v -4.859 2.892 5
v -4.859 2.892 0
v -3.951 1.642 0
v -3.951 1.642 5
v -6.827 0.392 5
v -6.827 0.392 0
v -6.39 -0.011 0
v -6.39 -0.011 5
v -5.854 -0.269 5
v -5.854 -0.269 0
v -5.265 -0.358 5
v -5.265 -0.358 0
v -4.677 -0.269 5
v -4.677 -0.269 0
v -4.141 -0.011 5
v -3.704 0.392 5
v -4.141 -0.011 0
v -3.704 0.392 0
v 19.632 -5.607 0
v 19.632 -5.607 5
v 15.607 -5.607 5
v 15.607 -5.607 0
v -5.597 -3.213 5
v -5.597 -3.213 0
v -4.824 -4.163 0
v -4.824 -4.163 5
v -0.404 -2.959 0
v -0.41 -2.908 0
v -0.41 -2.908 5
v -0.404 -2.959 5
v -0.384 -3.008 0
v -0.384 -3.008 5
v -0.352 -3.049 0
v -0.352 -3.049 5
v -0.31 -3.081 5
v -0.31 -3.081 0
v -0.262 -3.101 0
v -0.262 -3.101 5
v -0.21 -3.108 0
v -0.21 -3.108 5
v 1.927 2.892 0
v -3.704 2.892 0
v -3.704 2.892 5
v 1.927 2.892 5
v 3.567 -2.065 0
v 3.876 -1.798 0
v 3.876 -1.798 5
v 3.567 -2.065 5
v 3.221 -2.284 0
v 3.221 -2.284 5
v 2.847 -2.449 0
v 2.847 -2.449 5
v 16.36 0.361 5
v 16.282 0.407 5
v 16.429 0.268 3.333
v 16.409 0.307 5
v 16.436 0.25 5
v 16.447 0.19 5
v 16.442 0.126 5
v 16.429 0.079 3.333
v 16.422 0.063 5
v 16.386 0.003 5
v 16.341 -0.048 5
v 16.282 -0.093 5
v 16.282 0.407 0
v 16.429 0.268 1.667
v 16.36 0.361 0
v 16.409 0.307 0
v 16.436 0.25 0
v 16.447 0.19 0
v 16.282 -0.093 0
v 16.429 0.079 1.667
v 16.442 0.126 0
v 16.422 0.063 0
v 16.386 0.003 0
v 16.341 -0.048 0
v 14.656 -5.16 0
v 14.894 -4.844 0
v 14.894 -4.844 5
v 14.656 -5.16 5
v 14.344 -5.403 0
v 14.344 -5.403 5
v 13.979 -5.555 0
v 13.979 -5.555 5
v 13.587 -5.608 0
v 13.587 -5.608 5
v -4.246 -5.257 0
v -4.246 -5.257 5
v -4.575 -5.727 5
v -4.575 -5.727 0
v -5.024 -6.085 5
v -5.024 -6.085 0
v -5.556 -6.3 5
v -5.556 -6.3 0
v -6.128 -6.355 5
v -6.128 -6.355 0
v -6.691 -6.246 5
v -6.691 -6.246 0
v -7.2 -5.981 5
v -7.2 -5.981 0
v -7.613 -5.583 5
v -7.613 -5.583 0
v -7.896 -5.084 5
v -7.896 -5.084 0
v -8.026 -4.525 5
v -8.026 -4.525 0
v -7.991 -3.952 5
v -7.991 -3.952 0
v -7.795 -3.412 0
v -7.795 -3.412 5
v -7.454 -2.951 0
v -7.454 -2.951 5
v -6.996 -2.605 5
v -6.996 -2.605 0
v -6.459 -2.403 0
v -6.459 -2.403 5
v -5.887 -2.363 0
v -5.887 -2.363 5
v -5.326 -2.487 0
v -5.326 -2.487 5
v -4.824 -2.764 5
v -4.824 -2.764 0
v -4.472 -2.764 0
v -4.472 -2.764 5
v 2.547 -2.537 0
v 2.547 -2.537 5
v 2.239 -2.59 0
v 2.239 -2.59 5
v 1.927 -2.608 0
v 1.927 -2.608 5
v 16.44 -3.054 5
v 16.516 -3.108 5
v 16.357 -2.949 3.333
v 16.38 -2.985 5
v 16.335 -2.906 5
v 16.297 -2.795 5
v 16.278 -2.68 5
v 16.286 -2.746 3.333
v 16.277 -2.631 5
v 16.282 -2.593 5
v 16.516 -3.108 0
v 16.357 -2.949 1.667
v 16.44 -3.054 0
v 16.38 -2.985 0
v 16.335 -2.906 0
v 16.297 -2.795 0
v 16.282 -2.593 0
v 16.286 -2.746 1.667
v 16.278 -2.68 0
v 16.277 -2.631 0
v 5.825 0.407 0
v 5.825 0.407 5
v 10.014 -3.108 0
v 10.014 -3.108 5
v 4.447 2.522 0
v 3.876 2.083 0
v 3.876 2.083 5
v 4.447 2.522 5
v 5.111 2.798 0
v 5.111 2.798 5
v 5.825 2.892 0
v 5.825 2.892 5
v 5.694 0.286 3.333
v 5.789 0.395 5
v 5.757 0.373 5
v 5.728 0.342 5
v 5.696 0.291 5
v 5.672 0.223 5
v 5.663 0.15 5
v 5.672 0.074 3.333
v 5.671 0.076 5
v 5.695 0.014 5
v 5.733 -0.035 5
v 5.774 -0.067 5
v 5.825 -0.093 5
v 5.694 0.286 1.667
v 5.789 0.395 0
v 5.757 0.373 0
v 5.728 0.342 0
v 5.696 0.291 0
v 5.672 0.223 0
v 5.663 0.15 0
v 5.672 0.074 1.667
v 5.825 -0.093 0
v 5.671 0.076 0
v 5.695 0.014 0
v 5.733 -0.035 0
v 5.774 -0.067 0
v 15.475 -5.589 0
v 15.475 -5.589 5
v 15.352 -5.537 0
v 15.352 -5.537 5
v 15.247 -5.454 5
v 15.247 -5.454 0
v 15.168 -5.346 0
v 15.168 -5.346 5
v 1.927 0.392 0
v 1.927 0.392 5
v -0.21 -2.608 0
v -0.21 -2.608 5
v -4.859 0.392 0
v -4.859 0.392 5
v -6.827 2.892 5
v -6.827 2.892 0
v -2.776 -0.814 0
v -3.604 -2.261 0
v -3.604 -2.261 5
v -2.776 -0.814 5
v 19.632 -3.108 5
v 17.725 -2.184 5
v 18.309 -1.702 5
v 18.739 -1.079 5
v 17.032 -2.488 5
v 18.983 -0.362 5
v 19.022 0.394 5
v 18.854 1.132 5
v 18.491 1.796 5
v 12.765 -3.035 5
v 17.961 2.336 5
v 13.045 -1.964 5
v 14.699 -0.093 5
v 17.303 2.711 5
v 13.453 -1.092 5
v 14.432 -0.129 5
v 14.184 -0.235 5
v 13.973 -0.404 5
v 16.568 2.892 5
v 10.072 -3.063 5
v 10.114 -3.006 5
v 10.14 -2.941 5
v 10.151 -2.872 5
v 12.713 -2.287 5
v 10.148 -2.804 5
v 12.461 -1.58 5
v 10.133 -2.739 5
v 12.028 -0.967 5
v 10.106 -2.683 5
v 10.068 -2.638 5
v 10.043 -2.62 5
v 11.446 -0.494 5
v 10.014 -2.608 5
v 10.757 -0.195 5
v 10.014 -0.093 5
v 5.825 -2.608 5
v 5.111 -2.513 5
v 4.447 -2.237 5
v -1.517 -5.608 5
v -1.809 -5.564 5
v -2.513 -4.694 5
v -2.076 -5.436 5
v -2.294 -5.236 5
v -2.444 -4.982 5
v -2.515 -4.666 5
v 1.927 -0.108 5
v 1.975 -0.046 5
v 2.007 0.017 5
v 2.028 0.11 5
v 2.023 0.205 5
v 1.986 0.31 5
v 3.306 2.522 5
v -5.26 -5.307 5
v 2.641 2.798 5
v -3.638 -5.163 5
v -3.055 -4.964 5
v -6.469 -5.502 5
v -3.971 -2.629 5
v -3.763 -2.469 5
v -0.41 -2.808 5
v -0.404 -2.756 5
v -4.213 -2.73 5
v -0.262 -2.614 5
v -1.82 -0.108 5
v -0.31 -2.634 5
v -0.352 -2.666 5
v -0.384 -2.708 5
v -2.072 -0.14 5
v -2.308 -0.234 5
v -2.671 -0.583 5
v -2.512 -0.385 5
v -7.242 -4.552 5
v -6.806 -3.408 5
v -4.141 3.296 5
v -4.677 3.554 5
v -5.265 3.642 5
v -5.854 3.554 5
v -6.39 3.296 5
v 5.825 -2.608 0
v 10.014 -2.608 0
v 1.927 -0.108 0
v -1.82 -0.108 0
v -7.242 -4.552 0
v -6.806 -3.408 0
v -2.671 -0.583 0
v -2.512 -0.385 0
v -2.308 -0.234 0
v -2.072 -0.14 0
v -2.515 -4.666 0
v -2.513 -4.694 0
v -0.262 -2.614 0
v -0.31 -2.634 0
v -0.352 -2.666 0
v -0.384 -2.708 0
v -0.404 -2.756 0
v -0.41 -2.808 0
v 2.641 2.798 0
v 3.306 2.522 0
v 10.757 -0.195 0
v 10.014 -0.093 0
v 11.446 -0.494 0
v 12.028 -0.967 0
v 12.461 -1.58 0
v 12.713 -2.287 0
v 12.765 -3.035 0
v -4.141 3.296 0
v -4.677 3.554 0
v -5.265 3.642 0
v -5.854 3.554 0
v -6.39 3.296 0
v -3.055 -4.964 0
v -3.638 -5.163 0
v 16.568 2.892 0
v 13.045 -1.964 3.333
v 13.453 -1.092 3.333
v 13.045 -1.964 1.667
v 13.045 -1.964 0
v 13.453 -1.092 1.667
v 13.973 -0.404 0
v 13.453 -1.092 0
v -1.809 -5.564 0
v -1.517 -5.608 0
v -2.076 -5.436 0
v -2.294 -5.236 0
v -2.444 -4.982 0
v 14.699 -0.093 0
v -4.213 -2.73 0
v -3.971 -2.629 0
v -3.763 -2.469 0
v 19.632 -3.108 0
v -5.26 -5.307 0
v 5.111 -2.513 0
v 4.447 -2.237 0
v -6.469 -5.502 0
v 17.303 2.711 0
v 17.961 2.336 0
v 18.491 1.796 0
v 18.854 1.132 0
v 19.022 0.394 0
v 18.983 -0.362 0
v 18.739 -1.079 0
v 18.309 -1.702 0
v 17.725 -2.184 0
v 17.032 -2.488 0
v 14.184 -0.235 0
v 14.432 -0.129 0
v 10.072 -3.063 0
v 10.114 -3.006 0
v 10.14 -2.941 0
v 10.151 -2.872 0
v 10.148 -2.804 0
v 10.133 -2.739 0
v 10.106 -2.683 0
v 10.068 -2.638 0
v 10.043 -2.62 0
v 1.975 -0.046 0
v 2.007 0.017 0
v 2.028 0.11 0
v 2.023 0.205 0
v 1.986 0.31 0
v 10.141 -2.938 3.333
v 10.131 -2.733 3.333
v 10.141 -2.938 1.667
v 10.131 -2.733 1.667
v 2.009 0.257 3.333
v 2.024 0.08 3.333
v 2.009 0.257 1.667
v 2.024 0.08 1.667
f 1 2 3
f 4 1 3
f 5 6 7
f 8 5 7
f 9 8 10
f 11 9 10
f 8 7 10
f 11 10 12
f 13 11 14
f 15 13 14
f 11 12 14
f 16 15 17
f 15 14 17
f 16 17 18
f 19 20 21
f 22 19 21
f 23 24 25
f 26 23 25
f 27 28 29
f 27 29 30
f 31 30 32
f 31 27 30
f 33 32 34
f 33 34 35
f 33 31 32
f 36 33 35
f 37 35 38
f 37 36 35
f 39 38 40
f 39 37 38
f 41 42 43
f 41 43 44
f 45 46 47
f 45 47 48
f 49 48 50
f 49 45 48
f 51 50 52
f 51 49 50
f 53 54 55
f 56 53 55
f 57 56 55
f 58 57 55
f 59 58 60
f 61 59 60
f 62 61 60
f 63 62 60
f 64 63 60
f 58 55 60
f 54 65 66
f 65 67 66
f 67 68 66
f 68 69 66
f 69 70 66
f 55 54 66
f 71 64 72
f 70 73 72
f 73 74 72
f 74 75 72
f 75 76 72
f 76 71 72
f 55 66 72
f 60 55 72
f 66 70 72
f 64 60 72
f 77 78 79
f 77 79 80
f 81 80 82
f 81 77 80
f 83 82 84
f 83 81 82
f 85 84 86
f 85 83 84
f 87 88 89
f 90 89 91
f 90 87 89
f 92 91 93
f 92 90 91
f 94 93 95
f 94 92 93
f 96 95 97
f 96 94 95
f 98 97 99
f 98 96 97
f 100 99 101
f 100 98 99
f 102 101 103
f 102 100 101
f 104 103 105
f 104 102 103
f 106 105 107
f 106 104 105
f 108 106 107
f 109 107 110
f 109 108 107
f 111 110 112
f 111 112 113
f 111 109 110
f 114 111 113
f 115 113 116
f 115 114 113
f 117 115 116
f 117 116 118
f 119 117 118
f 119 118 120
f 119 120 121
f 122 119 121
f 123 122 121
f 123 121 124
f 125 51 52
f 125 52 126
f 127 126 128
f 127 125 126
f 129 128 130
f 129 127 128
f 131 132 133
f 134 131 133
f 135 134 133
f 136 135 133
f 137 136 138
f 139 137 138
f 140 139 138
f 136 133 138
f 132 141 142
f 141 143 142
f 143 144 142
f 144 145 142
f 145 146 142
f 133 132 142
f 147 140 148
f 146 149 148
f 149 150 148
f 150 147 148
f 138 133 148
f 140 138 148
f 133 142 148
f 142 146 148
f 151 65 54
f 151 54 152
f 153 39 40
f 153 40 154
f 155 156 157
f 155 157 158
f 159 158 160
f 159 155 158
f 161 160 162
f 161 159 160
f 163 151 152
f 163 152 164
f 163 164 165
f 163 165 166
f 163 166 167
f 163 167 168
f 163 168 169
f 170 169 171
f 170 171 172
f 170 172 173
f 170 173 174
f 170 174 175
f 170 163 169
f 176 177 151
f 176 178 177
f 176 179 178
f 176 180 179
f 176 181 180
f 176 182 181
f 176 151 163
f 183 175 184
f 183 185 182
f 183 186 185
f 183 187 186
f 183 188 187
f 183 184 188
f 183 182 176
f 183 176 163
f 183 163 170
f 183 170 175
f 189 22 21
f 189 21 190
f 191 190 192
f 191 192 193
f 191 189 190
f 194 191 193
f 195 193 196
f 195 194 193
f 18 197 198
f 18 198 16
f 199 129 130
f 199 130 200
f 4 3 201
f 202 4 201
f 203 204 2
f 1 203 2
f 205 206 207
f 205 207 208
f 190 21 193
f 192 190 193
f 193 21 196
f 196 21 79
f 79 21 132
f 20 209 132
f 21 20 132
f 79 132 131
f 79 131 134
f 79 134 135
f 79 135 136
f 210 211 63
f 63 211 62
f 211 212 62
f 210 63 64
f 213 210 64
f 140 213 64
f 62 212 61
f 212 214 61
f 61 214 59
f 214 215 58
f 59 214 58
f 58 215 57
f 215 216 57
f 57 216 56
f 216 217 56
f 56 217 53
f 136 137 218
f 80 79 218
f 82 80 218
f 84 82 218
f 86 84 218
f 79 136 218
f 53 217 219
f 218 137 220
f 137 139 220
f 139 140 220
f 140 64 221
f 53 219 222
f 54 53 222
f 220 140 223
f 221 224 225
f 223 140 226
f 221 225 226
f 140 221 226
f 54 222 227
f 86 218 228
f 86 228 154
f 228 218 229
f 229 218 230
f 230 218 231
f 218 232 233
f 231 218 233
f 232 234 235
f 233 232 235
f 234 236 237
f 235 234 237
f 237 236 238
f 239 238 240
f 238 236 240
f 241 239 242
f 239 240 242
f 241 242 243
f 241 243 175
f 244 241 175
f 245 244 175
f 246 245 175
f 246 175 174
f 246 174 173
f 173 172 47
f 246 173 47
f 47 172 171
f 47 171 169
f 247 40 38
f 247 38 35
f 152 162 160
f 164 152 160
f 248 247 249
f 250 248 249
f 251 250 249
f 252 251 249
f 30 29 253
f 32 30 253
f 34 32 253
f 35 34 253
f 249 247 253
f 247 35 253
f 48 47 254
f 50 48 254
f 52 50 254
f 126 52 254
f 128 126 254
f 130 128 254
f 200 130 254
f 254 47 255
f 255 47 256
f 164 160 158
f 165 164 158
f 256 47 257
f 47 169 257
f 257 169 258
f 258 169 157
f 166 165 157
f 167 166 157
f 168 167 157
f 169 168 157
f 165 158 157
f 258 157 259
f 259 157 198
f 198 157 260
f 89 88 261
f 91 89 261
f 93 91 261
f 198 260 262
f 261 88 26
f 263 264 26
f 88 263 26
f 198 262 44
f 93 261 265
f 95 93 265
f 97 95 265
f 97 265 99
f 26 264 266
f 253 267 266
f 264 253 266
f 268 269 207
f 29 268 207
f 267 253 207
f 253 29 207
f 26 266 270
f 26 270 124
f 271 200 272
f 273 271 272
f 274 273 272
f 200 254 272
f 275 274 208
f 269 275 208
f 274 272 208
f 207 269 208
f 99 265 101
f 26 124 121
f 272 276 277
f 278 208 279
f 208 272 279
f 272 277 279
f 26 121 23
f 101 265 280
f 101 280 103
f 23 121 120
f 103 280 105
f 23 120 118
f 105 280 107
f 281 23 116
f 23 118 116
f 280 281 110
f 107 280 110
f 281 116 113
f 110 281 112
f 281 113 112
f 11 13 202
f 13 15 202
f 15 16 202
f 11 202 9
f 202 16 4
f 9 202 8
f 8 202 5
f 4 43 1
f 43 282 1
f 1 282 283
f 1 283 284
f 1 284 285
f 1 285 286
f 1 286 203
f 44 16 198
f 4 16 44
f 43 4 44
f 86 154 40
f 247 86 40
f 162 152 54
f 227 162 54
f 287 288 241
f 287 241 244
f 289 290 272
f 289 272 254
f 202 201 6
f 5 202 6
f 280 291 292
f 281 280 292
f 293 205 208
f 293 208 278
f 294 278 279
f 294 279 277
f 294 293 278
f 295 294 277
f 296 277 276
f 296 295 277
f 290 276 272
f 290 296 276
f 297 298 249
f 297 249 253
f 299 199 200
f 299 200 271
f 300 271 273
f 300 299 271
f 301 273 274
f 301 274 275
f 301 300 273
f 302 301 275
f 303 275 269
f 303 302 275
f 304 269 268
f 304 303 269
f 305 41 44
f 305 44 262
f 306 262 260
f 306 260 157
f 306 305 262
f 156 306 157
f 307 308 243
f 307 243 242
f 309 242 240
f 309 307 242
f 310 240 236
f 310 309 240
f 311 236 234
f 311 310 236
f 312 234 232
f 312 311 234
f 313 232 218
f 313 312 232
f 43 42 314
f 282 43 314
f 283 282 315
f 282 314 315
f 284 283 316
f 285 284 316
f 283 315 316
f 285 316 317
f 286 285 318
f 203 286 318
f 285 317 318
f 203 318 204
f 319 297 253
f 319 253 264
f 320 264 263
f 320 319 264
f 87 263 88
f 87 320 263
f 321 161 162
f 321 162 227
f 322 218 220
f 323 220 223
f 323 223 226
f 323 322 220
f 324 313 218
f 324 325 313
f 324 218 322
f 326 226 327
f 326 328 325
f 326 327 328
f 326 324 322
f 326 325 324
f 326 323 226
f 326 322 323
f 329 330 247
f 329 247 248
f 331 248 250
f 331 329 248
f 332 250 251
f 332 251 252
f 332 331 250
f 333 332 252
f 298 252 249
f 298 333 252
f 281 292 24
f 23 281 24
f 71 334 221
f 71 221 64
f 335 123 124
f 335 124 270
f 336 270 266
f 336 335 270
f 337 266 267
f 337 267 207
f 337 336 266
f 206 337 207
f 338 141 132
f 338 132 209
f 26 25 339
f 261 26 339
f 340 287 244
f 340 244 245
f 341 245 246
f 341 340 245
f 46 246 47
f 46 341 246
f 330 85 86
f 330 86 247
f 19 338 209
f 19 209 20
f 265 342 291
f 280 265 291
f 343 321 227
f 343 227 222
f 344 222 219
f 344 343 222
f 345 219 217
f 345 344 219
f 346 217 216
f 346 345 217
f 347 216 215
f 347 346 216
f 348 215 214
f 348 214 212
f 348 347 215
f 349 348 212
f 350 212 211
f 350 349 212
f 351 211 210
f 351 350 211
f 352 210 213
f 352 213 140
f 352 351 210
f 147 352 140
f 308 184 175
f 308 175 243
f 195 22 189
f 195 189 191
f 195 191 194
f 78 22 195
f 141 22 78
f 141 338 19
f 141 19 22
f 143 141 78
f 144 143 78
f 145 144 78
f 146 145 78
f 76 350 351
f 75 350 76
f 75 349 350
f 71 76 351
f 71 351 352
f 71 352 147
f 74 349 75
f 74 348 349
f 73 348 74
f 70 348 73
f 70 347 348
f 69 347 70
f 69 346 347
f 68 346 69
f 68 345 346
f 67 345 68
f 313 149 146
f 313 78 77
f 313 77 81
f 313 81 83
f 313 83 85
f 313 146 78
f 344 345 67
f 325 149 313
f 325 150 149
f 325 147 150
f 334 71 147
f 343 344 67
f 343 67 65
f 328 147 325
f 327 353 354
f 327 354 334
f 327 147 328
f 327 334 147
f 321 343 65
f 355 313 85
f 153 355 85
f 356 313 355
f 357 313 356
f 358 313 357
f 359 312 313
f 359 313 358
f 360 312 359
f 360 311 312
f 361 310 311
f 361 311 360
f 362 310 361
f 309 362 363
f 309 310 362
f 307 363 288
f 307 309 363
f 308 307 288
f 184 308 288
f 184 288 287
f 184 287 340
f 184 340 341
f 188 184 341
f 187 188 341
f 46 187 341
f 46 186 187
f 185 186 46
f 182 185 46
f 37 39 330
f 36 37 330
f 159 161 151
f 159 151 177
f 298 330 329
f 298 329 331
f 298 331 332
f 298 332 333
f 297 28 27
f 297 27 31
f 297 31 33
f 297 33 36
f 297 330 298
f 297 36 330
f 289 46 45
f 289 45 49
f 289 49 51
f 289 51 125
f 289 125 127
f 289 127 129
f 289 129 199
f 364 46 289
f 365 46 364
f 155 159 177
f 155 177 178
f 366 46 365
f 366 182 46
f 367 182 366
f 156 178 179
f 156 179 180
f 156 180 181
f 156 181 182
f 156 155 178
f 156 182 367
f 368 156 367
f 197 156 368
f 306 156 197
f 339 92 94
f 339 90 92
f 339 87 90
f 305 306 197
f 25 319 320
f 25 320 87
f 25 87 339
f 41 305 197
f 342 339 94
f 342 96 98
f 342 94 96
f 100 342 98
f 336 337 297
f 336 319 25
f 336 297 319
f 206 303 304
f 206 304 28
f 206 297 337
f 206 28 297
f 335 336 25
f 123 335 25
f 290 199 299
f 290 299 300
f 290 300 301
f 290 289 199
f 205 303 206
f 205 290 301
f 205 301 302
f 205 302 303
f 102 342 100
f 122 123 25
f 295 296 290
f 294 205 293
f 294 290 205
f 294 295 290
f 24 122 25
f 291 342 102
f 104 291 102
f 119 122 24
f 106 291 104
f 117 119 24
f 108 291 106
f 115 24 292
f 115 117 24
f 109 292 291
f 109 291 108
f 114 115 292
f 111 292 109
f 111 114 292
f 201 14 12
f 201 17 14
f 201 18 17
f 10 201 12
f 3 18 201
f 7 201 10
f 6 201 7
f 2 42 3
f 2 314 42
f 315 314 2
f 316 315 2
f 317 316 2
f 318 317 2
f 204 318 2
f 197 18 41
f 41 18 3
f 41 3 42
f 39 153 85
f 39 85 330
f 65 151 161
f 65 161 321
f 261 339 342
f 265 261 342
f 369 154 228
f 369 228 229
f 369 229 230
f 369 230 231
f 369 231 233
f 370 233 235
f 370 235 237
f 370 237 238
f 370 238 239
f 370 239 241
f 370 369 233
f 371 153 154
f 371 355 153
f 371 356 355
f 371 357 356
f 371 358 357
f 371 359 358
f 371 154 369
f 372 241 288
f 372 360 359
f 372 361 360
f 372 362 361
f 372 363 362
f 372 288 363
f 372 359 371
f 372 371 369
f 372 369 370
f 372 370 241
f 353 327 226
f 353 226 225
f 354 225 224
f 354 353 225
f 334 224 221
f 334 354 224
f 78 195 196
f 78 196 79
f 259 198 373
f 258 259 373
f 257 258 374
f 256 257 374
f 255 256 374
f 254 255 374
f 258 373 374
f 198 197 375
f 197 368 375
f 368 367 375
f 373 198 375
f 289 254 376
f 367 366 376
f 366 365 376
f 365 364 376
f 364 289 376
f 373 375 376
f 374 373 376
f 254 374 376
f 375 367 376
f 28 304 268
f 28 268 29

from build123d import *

# Parameters (mm, degrees)
BOSS_EXTRUDE1_DEPTH = 5
BOSS_EXTRUDE2_DEPTH = 5
BOSS_EXTRUDE4_DEPTH = 5
BOSS_EXTRUDE6_DEPTH = 5
SKETCH9_R           = 2
BOSS_EXTRUDE7_DEPTH = 5


with BuildPart() as part:
    # Sketch1 → Boss-Extrude1 (new body)
    with BuildSketch(Plane.XY):
        with BuildLine():
            Line((-4.859145774, 0.392452951), (-6.826544894, 0.392452951))
            ThreePointArc((-6.826544894, 0.392452951), (-3.265295394, 1.642452951), (-6.826544894, 2.892452951))
            Line((-6.826544894, 2.892452951), (-4.859145774, 2.892452951))
            Line((-4.859145774, 2.892452951), (-3.950967614, 1.642452951))
            Line((-3.950967614, 1.642452951), (-4.859145774, 0.392452951))
        make_face()
    extrude(amount=BOSS_EXTRUDE1_DEPTH)

    # Sketch2 → Boss-Extrude2 (add)
    with BuildSketch(Plane(origin=(0, 0, 0), x_dir=(-1, 0, 0), z_dir=(0, 0, -1))):
        with BuildLine():
            ThreePointArc((3.704045895, 0.392452951), (3.265295394, 1.642452951), (3.704045895, 2.892452951))
            Line((3.704045895, 2.892452951), (-1.927293689, 2.892452951))
            Line((-1.927293689, 2.892452951), (-1.927293689, 0.392452951))
            Line((-1.927293689, 0.392452951), (3.704045895, 0.392452951))
        make_face()
    extrude(amount=-BOSS_EXTRUDE2_DEPTH)

    # Sketch7 → Boss-Extrude4 (add)
    with BuildSketch(Plane(origin=(0, 0, 0), x_dir=(-1, 0, 0), z_dir=(0, 0, -1))):
        with BuildLine():
            ThreePointArc((-1.927293689, 2.892452951), (-4.011161168, 1.936887773), (-4.646831412, -0.265731537))
            ThreePointArc((-4.646831412, -0.265731537), (-4.049138928, -1.606910585), (-2.846528345, -2.449362561))
            ThreePointArc((-2.846528345, -2.449362561), (-2.393666578, -2.567712418), (-1.927293689, -2.607547049))
            Line((-1.927293689, -2.607547049), (-1.927293689, -0.107547049))
            add(Edge.make_bspline(
                [(-1.927293689, 0.392452951), (-2.027068627, 0.287688693), (-2.096009728, 0.076120474), (-1.927293689, -0.107547049)],
                knots=[0, 0, 0, 0, 1, 1, 1, 1], degree=3))
            Line((-1.927293689, 0.392452951), (-1.927293689, 2.892452951))
        make_face()
        with BuildLine():
            Line((-1.927293689, -0.107547049), (-1.927293689, -2.607547049))
            ThreePointArc((-1.927293689, -2.607547049), (-0.073244067, -1.88855665), (0.811319098, -0.107547049))
            Line((0.811319098, -0.107547049), (-1.927293689, -0.107547049))
        make_face()
        with BuildLine():
            Line((-5.566066067, -5.607547049), (1.516820501, -5.607547049))
            ThreePointArc((1.516820501, -5.607547049), (2.192724029, -5.344537158), (2.51308893, -4.69385589))
            Line((2.51308893, -4.69385589), (2.816301333, -1.19385589))
            ThreePointArc((2.816301333, -1.19385589), (2.557023013, -0.431643521), (1.820032904, -0.107547049))
            Line((1.820032904, -0.107547049), (0.811319098, -0.107547049))
            ThreePointArc((0.811319098, -0.107547049), (-0.073244067, -1.88855665), (-1.927293689, -2.607547049))
            Line((-1.927293689, -2.607547049), (0.210410566, -2.607547049))
            ThreePointArc((0.210410566, -2.607547049), (0.351831922, -2.666125693), (0.410410566, -2.807547049))
            Line((0.410410566, -2.807547049), (0.410410566, -2.907547049))
            ThreePointArc((0.410410566, -2.907547049), (0.351831922, -3.048968405), (0.210410566, -3.107547049))
            Line((0.210410566, -3.107547049), (-2.82745328, -3.107547049))
            Line((-2.82745328, -3.107547049), (-5.566066067, -3.107547049))
            Line((-5.566066067, -3.107547049), (-5.566066067, -5.607547049))
        make_face()
    extrude(amount=-BOSS_EXTRUDE4_DEPTH)

    # Sketch8 → Boss-Extrude6 (add)
    with BuildSketch(Plane(origin=(0, 0, 0), x_dir=(-1, 0, 0), z_dir=(0, 0, -1))):
        with BuildLine():
            Line((-10.013976401, -2.607547049), (-5.825134583, -2.607547049))
            ThreePointArc((-5.825134583, -2.607547049), (-3.075134583, 0.142452951), (-5.825134583, 2.892452951))
            Line((-5.825134583, 2.892452951), (-16.568194085, 2.892452951))
            ThreePointArc((-16.568194085, 2.892452951), (-19.02871008, 0.014266669), (-16.282434429, -2.592659737))
            add(Edge.make_bspline(
                [(-16.515824565, -3.107547049), (-16.307464717, -3.001414127), (-16.25870467, -2.690751367), (-16.282434429, -2.592659737)],
                knots=[0, 0, 0, 0, 1, 1, 1, 1], degree=3))
            Line((-16.515824565, -3.107547049), (-19.631835761, -3.107547049))
            Line((-19.631835761, -3.107547049), (-19.631835761, -5.607101349))
            Line((-19.631835761, -5.607101349), (-16.213002559, -5.607101349))
            Line((-16.213002559, -5.607101349), (-15.606969091, -5.607101349))
            ThreePointArc((-15.606969091, -5.607101349), (-15.351610534, -5.536975757), (-15.167880656, -5.346269377))
            Line((-15.167880656, -5.346269377), (-14.894043788, -4.843532439))
            ThreePointArc((-14.894043788, -4.843532439), (-14.343989393, -5.402533166), (-13.587014521, -5.607547049))
            Line((-13.587014521, -5.607547049), (-12.513976401, -5.607547049))
            Line((-12.513976401, -5.607547049), (-10.013976401, -5.607547049))
            Line((-10.013976401, -5.607547049), (-5.566066067, -5.607547049))
            Line((-5.566066067, -5.607547049), (-5.566066067, -3.107547049))
            Line((-5.566066067, -3.107547049), (-10.013976401, -3.107547049))
            add(Edge.make_bspline(
                [(-10.013976401, -3.107547049), (-10.219087549, -2.993746895), (-10.173628104, -2.655391711), (-10.013976401, -2.607547049)],
                knots=[0, 0, 0, 0, 1, 1, 1, 1], degree=3))
        make_face()
        with BuildLine():
            ThreePointArc((-10.013976401, -0.092659737), (-12.028194826, -0.96690939), (-12.765194219, -3.035295286))
            add(Edge.make_bspline(
                [(-12.765194219, -3.035295286), (-12.975821702, -1.859806275), (-13.402295233, -1.005750906), (-13.973446446, -0.404146587)],
                knots=[0.010692284, 0.010692284, 0.010692284, 0.010692284, 0.535473495, 0.535473495, 0.535473495, 0.535473495], degree=3))
            ThreePointArc((-13.973446446, -0.404146587), (-14.304026887, -0.17382538), (-14.698670302, -0.092659737))
            Line((-14.698670302, -0.092659737), (-16.282434429, -0.092659737))
            add(Edge.make_bspline(
                [(-16.282434429, 0.407340263), (-16.503590414, 0.314326842), (-16.500815382, 0.048327648), (-16.282434429, -0.092659737)],
                knots=[0, 0, 0, 0, 1, 1, 1, 1], degree=3))
            Line((-16.282434429, 0.407340263), (-8.563747371, 0.407340263))
            Line((-8.563747371, 0.407340263), (-5.825134583, 0.407340263))
            add(Edge.make_bspline(
                [(-5.825134583, 0.407340263), (-5.661105782, 0.377805029), (-5.562243404, 0.004958528), (-5.825134583, -0.092659737)],
                knots=[0, 0, 0, 0, 1, 1, 1, 1], degree=3))
            Line((-5.825134583, -0.092659737), (-10.013976401, -0.092659737))
        make_face(mode=Mode.SUBTRACT)
    extrude(amount=-BOSS_EXTRUDE6_DEPTH)

    # Sketch9 → Boss-Extrude7 (add)
    # profile 1 of 2: a face of its own
    with BuildSketch(Plane(origin=(0, 0, 0), x_dir=(-1, 0, 0), z_dir=(0, 0, -1))):
        with BuildLine():
            ThreePointArc((4.246387568, -5.256955873), (4.08434285, -3.906172489), (4.823858789, -2.764248492))
            Line((4.823858789, -2.764248492), (4.472208625, -2.764248492))
            ThreePointArc((4.472208625, -2.764248492), (3.970628521, -2.629359698), (3.604363487, -2.26108329))
            Line((3.604363487, -2.26108329), (2.776044941, -0.814219613))
            ThreePointArc((2.776044941, -0.814219613), (2.814457703, -1.002098868), (2.816301333, -1.19385589))
            Line((2.816301333, -1.19385589), (2.515486097, -4.66618525))
            ThreePointArc((2.515486097, -4.66618525), (3.341666009, -5.076630322), (4.246387568, -5.256955873))
        make_face()
    # profile 2 of 2: a face of its own
    with BuildSketch(Plane(origin=(0, 0, 0), x_dir=(-1, 0, 0), z_dir=(0, 0, -1))):
        with Locations((6.032742451, -4.357547049)):
            Circle(SKETCH9_R)
        Polygon((6.805727945, -3.407931817), (5.596844283, -3.213314358), (4.823858789, -4.16292959), (5.259756957, -5.307162281), (6.468640619, -5.501779739), (7.241626113, -4.552164507), align=None, mode=Mode.SUBTRACT)
    extrude(amount=-BOSS_EXTRUDE7_DEPTH)


solid = part.part
